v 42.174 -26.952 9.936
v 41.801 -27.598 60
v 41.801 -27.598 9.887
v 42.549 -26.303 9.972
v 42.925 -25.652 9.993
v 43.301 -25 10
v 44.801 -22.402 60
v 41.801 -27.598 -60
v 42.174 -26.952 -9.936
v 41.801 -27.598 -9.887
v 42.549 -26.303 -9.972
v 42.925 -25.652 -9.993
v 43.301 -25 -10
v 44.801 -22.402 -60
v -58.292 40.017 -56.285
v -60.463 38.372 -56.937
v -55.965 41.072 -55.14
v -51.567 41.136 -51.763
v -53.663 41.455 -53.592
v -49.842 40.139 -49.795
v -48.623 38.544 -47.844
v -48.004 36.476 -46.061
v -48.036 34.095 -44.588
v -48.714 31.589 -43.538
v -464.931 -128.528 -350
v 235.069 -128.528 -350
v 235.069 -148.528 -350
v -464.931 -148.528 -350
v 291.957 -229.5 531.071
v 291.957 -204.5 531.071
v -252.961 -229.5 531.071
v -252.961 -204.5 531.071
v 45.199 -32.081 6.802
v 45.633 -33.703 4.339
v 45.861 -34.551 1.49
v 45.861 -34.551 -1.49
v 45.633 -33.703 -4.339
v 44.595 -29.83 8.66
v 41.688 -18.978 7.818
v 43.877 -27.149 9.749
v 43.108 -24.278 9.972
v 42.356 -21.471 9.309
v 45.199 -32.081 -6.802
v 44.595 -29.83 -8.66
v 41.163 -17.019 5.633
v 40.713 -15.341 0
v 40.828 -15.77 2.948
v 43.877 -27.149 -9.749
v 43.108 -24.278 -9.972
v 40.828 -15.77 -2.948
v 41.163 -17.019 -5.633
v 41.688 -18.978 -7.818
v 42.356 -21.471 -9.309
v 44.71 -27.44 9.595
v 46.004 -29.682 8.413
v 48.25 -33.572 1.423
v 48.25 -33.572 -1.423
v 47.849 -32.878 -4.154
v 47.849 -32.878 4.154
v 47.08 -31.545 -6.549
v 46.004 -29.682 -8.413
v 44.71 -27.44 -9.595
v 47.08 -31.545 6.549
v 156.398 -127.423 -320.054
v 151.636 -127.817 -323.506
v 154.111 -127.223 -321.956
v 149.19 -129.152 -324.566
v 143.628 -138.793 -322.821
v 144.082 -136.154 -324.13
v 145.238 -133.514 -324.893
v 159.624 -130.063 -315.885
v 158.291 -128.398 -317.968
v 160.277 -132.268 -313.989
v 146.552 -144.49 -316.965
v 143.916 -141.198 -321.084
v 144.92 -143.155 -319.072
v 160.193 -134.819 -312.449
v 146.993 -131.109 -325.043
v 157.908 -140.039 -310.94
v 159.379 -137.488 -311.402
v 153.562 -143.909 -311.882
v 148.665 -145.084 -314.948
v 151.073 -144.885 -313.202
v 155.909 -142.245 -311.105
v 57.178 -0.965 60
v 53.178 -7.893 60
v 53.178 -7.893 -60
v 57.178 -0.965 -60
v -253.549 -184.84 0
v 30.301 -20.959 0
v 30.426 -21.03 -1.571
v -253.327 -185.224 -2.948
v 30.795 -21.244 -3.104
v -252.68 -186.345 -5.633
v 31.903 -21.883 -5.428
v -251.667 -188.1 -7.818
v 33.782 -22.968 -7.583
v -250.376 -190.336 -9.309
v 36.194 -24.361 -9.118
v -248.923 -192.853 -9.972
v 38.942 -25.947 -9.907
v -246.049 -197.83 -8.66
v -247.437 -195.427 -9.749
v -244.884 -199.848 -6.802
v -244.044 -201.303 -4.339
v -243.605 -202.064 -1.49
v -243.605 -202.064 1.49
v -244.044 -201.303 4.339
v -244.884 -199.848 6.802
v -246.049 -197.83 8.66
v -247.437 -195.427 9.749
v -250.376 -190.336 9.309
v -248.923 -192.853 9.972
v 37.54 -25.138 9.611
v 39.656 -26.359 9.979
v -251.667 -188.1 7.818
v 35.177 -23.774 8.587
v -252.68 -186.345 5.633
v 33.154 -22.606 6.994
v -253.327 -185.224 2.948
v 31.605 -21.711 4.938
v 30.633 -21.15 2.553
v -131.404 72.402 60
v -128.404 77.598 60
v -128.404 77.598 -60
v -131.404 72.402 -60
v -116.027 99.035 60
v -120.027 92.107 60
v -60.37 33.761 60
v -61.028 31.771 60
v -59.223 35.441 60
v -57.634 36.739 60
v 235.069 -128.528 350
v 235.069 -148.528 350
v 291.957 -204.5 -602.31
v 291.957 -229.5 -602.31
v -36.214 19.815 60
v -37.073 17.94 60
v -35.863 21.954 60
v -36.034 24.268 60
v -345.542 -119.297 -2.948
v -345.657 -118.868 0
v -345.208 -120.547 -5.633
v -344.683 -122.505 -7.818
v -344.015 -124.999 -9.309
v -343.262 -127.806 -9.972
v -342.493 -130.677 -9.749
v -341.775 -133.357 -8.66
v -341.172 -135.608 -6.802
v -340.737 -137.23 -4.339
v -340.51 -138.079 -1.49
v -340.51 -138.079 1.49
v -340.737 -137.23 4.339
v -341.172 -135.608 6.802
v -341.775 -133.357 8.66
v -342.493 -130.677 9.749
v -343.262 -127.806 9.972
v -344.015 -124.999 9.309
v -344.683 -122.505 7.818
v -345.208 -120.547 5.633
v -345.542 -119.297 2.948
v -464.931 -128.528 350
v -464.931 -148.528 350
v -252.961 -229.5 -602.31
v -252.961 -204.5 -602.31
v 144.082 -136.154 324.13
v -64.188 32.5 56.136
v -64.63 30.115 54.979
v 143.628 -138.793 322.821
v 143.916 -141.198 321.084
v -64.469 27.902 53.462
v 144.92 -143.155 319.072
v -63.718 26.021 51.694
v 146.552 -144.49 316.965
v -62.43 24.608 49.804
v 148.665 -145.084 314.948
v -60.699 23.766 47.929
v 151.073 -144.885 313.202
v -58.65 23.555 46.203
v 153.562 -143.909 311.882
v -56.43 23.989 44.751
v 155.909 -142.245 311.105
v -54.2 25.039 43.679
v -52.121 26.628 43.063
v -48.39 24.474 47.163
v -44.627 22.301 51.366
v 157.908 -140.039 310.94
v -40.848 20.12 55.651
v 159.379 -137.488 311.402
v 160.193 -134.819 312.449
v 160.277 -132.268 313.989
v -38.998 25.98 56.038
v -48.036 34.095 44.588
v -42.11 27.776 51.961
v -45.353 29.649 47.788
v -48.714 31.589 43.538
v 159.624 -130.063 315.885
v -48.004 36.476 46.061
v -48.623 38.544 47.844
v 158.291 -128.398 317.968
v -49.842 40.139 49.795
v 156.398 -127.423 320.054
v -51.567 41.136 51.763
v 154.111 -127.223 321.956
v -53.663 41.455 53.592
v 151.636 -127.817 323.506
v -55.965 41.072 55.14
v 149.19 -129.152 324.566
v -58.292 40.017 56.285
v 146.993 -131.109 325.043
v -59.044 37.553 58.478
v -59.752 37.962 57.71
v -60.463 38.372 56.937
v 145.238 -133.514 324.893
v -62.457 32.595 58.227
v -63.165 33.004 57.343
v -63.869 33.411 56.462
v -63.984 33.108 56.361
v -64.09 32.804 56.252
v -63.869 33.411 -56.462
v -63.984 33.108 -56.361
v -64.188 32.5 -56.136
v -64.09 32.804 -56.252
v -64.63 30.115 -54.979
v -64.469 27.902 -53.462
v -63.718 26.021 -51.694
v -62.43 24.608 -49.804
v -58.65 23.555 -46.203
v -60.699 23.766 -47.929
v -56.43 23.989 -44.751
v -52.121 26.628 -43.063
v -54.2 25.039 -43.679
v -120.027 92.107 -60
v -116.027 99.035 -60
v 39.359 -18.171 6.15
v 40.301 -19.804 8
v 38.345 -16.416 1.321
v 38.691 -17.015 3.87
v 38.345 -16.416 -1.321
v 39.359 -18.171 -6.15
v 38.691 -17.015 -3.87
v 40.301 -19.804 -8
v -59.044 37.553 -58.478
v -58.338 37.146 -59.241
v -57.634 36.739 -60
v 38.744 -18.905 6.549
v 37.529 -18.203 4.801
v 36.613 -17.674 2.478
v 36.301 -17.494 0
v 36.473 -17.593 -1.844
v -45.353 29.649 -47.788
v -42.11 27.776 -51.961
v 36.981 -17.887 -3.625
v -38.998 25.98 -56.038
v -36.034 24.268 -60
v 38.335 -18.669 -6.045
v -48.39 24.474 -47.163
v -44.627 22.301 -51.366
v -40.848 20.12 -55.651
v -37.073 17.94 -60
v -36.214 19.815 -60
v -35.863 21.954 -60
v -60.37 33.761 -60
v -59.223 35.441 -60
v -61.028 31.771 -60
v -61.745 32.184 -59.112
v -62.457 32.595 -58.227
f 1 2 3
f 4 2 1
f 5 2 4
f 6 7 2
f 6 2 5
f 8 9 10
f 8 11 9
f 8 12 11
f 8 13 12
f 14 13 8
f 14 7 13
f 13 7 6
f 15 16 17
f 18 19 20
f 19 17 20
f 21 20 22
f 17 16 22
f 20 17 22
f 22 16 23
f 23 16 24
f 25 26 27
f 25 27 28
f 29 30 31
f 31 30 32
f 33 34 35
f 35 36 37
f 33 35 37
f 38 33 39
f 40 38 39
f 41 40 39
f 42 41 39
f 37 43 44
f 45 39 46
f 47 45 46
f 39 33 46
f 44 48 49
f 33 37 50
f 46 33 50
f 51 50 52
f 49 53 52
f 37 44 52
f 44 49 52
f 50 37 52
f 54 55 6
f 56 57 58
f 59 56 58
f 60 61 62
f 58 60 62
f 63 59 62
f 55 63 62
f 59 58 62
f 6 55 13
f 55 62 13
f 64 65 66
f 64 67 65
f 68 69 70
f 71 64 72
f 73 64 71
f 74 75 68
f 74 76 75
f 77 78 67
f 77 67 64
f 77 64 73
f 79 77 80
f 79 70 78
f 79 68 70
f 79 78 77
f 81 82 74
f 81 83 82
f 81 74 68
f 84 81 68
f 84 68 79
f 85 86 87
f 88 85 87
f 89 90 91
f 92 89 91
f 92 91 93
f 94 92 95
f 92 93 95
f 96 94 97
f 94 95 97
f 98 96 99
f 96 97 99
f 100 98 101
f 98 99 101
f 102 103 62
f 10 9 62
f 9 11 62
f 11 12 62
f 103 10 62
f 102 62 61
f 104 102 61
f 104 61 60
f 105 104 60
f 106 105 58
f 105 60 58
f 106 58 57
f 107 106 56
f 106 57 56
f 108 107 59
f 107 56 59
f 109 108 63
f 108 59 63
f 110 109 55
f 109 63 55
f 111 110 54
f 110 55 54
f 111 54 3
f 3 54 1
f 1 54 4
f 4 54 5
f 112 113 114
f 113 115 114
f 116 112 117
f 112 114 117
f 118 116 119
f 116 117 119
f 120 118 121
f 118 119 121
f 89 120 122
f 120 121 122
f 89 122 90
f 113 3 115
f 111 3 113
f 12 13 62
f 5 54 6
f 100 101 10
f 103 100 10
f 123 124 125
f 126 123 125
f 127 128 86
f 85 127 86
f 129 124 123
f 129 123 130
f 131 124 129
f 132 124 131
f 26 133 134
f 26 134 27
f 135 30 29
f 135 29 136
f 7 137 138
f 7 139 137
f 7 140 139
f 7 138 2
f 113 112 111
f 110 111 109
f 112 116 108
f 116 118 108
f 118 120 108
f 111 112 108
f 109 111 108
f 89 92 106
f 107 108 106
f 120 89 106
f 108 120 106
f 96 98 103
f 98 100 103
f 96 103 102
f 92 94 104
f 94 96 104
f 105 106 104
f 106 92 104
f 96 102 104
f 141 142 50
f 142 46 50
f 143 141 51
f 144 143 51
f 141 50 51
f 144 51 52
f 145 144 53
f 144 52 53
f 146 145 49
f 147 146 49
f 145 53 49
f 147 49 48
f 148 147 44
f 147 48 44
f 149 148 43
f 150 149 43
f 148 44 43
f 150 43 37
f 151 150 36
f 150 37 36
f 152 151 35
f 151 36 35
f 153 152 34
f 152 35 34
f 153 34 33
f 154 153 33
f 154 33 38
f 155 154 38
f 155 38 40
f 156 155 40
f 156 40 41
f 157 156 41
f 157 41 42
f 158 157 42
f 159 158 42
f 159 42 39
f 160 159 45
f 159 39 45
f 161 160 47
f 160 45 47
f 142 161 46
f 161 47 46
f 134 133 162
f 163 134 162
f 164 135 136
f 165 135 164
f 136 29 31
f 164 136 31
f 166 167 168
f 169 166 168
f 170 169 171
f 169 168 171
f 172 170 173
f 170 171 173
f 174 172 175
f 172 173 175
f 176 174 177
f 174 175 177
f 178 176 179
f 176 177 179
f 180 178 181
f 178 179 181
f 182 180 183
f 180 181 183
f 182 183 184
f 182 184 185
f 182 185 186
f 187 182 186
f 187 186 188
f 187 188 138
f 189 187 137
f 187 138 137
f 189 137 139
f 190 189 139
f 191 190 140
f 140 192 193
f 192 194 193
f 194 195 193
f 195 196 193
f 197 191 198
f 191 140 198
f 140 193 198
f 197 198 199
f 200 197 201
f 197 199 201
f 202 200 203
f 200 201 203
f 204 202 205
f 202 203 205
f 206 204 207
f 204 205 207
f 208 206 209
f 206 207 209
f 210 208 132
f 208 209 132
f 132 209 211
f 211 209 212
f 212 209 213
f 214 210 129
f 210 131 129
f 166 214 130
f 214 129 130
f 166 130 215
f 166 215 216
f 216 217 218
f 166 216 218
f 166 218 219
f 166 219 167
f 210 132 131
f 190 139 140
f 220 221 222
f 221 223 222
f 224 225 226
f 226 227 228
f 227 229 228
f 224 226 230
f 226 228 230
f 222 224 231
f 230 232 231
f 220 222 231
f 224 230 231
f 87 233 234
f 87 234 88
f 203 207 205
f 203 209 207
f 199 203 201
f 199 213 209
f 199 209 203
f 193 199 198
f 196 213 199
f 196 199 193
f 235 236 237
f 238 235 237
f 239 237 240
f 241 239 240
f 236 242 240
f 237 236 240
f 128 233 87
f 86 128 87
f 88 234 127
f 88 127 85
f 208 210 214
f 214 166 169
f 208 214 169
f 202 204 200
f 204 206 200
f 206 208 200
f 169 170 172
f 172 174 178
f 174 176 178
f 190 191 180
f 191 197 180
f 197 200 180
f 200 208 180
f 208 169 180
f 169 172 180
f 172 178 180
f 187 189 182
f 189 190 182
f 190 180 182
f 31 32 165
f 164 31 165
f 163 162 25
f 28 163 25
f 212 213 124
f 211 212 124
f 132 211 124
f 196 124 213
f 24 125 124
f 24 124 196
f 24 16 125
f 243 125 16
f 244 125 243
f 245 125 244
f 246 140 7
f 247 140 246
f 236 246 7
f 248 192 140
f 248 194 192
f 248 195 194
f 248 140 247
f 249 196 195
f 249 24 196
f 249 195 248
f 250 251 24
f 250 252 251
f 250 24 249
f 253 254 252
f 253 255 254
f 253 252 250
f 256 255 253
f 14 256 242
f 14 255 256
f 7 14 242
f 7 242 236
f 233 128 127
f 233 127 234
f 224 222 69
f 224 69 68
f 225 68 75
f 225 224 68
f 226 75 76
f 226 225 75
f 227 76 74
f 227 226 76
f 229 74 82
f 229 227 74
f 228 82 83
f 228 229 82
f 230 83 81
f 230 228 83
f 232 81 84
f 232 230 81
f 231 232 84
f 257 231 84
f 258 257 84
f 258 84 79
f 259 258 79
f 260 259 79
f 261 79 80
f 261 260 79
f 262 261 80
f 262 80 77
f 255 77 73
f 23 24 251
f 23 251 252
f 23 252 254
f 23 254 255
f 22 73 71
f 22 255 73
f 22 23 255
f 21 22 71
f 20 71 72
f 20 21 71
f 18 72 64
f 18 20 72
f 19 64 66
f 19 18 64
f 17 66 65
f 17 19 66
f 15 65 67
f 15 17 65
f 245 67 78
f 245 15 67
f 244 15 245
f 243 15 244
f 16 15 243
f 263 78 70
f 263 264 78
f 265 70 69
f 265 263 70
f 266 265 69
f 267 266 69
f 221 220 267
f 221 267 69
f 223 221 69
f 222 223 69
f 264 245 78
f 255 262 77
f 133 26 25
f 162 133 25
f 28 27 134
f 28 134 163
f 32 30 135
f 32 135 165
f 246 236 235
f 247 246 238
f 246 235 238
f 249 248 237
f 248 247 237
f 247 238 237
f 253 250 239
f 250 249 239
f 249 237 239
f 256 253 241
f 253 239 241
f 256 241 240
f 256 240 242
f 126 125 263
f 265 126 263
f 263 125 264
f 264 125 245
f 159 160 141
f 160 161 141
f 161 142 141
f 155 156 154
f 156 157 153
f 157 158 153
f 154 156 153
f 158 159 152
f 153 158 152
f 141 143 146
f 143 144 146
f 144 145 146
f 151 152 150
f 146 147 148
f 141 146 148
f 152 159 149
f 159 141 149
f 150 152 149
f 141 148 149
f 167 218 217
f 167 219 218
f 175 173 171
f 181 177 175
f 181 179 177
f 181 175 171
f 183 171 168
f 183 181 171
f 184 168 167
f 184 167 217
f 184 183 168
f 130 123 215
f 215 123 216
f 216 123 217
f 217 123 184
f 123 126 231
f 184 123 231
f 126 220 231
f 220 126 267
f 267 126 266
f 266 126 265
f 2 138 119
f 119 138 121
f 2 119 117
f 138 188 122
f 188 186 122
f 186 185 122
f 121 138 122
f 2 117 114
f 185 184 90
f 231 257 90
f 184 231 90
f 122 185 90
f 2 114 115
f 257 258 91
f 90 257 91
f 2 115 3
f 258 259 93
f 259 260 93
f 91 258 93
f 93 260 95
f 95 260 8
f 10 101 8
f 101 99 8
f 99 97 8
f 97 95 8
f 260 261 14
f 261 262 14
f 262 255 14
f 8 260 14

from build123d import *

# Parameters (mm, degrees)
SCHIZZO3_W                   = 200
SCHIZZO3_H                   = 120
ESTRUSIONE_ESTRUSIONE1_DEPTH = 3
SCHIZZO5_W                   = 700
SCHIZZO5_H                   = 700
ESTRUSIONE_ESTRUSIONE2_DEPTH = 20
SCHIZZO8_W                   = 379
SCHIZZO8_H                   = 10
SCHIZZO22_W                  = 544.918033461
SCHIZZO22_H                  = 1133.381514453
ESTRUSIONE_ESTRUSIONE3_DEPTH = 25
SCHIZZO24_W                  = 200
SCHIZZO24_H                  = 120
ESTRUSIONE_ESTRUSIONE4_DEPTH = 8


with BuildPart() as part:
    # Schizzo3 → Estrusione-Estrusione1 (new, symmetric)
    with BuildSketch(Plane(origin=(0, 0, 0), x_dir=(0.8660254037844421, -0.4999999999999939, 0), z_dir=(0.499999999999994, 0.8660254037844423, 0))):
        with Locations((-50, 0)):
            Rectangle(SCHIZZO3_W, SCHIZZO3_H)
    extrude(amount=ESTRUSIONE_ESTRUSIONE1_DEPTH, both=True)

    # Schizzo8 → Rivoluzione5 (revolve)
    with BuildSketch(Plane(origin=(4.874204469, -17.031133335, -14.506007809), x_dir=(-0.5495251793179629, 0.4449967160503128, -0.7071067811865462), z_dir=(-0.6293203910498404, -0.7771459614569687, 0)), mode=Mode.PRIVATE) as rivoluzione5_sk:
        with Locations((-179.459266043, -96.266005055)):
            Rectangle(SCHIZZO8_W, SCHIZZO8_H)
    rivoluzione5 = revolve(rivoluzione5_sk.sketch.rotate(Axis((-56.291651246, 32.5, 50), (0.5495251793179627, -0.44499671605031277, 0.7071067811865462)), 209.795615497), axis=Axis((-56.291651246, 32.5, 50), (0.5495251793179627, -0.44499671605031277, 0.7071067811865462)))

    # Specchia1: Rivoluzione5 across plane
    add(rivoluzione5.mirror(Plane.XY))

    # Schizzo17 → Rivoluzione4 (revolve)
    with BuildSketch(Plane.XY, mode=Mode.PRIVATE) as rivoluzione4_sk:
        Polygon((43.301270189, -25), (-248.549290886, -193.5), (-243.549290886, -202.160254038), (48.301270189, -33.660254038), align=None)
    revolve(rivoluzione4_sk.sketch.rotate(Axis((43.301270189, -25, 0), (-0.8660254037844356, -0.5000000000000054, 0)), 180), axis=Axis((43.301270189, -25, 0), (-0.8660254037844356, -0.5000000000000054, 0)))


with BuildPart() as body_2:
    # Schizzo5 → Estrusione-Estrusione2 (new body)
    with BuildSketch(Plane(origin=(0, -128.527618041, 0), x_dir=(-1, 0, 0), z_dir=(0, -1, 0))):
        with Locations((114.931214363, 0)):
            Rectangle(SCHIZZO5_W, SCHIZZO5_H)
    extrude(amount=ESTRUSIONE_ESTRUSIONE2_DEPTH)


with BuildPart() as body_3:
    # Schizzo1 → Rivoluzione1 (revolve)
    with BuildSketch(Plane.XY, mode=Mode.PRIVATE) as rivoluzione1_sk:
        Polygon((43.301270189, -25), (-343.069060326, -128.527618041), (-340.480869875, -138.186876304), (45.88946064, -34.659258263), align=None)
    revolve(rivoluzione1_sk.sketch.rotate(Axis((43.301270189, -25, 0), (-0.9659258262890681, -0.2588190451025217, 0)), 180), axis=Axis((43.301270189, -25, 0), (-0.9659258262890681, -0.2588190451025217, 0)))


with BuildPart() as body_4:
    # Schizzo22 → Estrusione-Estrusione3 (new body)
    with BuildSketch(Plane(origin=(0, -204.5, 0), x_dir=(-1, 0, 0), z_dir=(0, -1, 0))):
        with Locations((-19.498183113, 35.619737897)):
            Rectangle(SCHIZZO22_W, SCHIZZO22_H)
    extrude(amount=ESTRUSIONE_ESTRUSIONE3_DEPTH)


with BuildPart() as body_5:
    # Schizzo24 → Estrusione-Estrusione4 (new body)
    with BuildSketch(Plane(origin=(9.876883406, 17.10726388, 0), x_dir=(0.8660254037844421, -0.4999999999999939, 0), z_dir=(0.4999999999999939, 0.8660254037844421, 0))):
        with Locations((-50, 0)):
            Rectangle(SCHIZZO24_W, SCHIZZO24_H)
    extrude(amount=ESTRUSIONE_ESTRUSIONE4_DEPTH)


solid = Compound([part.part, body_2.part, body_3.part, body_4.part, body_5.part])
